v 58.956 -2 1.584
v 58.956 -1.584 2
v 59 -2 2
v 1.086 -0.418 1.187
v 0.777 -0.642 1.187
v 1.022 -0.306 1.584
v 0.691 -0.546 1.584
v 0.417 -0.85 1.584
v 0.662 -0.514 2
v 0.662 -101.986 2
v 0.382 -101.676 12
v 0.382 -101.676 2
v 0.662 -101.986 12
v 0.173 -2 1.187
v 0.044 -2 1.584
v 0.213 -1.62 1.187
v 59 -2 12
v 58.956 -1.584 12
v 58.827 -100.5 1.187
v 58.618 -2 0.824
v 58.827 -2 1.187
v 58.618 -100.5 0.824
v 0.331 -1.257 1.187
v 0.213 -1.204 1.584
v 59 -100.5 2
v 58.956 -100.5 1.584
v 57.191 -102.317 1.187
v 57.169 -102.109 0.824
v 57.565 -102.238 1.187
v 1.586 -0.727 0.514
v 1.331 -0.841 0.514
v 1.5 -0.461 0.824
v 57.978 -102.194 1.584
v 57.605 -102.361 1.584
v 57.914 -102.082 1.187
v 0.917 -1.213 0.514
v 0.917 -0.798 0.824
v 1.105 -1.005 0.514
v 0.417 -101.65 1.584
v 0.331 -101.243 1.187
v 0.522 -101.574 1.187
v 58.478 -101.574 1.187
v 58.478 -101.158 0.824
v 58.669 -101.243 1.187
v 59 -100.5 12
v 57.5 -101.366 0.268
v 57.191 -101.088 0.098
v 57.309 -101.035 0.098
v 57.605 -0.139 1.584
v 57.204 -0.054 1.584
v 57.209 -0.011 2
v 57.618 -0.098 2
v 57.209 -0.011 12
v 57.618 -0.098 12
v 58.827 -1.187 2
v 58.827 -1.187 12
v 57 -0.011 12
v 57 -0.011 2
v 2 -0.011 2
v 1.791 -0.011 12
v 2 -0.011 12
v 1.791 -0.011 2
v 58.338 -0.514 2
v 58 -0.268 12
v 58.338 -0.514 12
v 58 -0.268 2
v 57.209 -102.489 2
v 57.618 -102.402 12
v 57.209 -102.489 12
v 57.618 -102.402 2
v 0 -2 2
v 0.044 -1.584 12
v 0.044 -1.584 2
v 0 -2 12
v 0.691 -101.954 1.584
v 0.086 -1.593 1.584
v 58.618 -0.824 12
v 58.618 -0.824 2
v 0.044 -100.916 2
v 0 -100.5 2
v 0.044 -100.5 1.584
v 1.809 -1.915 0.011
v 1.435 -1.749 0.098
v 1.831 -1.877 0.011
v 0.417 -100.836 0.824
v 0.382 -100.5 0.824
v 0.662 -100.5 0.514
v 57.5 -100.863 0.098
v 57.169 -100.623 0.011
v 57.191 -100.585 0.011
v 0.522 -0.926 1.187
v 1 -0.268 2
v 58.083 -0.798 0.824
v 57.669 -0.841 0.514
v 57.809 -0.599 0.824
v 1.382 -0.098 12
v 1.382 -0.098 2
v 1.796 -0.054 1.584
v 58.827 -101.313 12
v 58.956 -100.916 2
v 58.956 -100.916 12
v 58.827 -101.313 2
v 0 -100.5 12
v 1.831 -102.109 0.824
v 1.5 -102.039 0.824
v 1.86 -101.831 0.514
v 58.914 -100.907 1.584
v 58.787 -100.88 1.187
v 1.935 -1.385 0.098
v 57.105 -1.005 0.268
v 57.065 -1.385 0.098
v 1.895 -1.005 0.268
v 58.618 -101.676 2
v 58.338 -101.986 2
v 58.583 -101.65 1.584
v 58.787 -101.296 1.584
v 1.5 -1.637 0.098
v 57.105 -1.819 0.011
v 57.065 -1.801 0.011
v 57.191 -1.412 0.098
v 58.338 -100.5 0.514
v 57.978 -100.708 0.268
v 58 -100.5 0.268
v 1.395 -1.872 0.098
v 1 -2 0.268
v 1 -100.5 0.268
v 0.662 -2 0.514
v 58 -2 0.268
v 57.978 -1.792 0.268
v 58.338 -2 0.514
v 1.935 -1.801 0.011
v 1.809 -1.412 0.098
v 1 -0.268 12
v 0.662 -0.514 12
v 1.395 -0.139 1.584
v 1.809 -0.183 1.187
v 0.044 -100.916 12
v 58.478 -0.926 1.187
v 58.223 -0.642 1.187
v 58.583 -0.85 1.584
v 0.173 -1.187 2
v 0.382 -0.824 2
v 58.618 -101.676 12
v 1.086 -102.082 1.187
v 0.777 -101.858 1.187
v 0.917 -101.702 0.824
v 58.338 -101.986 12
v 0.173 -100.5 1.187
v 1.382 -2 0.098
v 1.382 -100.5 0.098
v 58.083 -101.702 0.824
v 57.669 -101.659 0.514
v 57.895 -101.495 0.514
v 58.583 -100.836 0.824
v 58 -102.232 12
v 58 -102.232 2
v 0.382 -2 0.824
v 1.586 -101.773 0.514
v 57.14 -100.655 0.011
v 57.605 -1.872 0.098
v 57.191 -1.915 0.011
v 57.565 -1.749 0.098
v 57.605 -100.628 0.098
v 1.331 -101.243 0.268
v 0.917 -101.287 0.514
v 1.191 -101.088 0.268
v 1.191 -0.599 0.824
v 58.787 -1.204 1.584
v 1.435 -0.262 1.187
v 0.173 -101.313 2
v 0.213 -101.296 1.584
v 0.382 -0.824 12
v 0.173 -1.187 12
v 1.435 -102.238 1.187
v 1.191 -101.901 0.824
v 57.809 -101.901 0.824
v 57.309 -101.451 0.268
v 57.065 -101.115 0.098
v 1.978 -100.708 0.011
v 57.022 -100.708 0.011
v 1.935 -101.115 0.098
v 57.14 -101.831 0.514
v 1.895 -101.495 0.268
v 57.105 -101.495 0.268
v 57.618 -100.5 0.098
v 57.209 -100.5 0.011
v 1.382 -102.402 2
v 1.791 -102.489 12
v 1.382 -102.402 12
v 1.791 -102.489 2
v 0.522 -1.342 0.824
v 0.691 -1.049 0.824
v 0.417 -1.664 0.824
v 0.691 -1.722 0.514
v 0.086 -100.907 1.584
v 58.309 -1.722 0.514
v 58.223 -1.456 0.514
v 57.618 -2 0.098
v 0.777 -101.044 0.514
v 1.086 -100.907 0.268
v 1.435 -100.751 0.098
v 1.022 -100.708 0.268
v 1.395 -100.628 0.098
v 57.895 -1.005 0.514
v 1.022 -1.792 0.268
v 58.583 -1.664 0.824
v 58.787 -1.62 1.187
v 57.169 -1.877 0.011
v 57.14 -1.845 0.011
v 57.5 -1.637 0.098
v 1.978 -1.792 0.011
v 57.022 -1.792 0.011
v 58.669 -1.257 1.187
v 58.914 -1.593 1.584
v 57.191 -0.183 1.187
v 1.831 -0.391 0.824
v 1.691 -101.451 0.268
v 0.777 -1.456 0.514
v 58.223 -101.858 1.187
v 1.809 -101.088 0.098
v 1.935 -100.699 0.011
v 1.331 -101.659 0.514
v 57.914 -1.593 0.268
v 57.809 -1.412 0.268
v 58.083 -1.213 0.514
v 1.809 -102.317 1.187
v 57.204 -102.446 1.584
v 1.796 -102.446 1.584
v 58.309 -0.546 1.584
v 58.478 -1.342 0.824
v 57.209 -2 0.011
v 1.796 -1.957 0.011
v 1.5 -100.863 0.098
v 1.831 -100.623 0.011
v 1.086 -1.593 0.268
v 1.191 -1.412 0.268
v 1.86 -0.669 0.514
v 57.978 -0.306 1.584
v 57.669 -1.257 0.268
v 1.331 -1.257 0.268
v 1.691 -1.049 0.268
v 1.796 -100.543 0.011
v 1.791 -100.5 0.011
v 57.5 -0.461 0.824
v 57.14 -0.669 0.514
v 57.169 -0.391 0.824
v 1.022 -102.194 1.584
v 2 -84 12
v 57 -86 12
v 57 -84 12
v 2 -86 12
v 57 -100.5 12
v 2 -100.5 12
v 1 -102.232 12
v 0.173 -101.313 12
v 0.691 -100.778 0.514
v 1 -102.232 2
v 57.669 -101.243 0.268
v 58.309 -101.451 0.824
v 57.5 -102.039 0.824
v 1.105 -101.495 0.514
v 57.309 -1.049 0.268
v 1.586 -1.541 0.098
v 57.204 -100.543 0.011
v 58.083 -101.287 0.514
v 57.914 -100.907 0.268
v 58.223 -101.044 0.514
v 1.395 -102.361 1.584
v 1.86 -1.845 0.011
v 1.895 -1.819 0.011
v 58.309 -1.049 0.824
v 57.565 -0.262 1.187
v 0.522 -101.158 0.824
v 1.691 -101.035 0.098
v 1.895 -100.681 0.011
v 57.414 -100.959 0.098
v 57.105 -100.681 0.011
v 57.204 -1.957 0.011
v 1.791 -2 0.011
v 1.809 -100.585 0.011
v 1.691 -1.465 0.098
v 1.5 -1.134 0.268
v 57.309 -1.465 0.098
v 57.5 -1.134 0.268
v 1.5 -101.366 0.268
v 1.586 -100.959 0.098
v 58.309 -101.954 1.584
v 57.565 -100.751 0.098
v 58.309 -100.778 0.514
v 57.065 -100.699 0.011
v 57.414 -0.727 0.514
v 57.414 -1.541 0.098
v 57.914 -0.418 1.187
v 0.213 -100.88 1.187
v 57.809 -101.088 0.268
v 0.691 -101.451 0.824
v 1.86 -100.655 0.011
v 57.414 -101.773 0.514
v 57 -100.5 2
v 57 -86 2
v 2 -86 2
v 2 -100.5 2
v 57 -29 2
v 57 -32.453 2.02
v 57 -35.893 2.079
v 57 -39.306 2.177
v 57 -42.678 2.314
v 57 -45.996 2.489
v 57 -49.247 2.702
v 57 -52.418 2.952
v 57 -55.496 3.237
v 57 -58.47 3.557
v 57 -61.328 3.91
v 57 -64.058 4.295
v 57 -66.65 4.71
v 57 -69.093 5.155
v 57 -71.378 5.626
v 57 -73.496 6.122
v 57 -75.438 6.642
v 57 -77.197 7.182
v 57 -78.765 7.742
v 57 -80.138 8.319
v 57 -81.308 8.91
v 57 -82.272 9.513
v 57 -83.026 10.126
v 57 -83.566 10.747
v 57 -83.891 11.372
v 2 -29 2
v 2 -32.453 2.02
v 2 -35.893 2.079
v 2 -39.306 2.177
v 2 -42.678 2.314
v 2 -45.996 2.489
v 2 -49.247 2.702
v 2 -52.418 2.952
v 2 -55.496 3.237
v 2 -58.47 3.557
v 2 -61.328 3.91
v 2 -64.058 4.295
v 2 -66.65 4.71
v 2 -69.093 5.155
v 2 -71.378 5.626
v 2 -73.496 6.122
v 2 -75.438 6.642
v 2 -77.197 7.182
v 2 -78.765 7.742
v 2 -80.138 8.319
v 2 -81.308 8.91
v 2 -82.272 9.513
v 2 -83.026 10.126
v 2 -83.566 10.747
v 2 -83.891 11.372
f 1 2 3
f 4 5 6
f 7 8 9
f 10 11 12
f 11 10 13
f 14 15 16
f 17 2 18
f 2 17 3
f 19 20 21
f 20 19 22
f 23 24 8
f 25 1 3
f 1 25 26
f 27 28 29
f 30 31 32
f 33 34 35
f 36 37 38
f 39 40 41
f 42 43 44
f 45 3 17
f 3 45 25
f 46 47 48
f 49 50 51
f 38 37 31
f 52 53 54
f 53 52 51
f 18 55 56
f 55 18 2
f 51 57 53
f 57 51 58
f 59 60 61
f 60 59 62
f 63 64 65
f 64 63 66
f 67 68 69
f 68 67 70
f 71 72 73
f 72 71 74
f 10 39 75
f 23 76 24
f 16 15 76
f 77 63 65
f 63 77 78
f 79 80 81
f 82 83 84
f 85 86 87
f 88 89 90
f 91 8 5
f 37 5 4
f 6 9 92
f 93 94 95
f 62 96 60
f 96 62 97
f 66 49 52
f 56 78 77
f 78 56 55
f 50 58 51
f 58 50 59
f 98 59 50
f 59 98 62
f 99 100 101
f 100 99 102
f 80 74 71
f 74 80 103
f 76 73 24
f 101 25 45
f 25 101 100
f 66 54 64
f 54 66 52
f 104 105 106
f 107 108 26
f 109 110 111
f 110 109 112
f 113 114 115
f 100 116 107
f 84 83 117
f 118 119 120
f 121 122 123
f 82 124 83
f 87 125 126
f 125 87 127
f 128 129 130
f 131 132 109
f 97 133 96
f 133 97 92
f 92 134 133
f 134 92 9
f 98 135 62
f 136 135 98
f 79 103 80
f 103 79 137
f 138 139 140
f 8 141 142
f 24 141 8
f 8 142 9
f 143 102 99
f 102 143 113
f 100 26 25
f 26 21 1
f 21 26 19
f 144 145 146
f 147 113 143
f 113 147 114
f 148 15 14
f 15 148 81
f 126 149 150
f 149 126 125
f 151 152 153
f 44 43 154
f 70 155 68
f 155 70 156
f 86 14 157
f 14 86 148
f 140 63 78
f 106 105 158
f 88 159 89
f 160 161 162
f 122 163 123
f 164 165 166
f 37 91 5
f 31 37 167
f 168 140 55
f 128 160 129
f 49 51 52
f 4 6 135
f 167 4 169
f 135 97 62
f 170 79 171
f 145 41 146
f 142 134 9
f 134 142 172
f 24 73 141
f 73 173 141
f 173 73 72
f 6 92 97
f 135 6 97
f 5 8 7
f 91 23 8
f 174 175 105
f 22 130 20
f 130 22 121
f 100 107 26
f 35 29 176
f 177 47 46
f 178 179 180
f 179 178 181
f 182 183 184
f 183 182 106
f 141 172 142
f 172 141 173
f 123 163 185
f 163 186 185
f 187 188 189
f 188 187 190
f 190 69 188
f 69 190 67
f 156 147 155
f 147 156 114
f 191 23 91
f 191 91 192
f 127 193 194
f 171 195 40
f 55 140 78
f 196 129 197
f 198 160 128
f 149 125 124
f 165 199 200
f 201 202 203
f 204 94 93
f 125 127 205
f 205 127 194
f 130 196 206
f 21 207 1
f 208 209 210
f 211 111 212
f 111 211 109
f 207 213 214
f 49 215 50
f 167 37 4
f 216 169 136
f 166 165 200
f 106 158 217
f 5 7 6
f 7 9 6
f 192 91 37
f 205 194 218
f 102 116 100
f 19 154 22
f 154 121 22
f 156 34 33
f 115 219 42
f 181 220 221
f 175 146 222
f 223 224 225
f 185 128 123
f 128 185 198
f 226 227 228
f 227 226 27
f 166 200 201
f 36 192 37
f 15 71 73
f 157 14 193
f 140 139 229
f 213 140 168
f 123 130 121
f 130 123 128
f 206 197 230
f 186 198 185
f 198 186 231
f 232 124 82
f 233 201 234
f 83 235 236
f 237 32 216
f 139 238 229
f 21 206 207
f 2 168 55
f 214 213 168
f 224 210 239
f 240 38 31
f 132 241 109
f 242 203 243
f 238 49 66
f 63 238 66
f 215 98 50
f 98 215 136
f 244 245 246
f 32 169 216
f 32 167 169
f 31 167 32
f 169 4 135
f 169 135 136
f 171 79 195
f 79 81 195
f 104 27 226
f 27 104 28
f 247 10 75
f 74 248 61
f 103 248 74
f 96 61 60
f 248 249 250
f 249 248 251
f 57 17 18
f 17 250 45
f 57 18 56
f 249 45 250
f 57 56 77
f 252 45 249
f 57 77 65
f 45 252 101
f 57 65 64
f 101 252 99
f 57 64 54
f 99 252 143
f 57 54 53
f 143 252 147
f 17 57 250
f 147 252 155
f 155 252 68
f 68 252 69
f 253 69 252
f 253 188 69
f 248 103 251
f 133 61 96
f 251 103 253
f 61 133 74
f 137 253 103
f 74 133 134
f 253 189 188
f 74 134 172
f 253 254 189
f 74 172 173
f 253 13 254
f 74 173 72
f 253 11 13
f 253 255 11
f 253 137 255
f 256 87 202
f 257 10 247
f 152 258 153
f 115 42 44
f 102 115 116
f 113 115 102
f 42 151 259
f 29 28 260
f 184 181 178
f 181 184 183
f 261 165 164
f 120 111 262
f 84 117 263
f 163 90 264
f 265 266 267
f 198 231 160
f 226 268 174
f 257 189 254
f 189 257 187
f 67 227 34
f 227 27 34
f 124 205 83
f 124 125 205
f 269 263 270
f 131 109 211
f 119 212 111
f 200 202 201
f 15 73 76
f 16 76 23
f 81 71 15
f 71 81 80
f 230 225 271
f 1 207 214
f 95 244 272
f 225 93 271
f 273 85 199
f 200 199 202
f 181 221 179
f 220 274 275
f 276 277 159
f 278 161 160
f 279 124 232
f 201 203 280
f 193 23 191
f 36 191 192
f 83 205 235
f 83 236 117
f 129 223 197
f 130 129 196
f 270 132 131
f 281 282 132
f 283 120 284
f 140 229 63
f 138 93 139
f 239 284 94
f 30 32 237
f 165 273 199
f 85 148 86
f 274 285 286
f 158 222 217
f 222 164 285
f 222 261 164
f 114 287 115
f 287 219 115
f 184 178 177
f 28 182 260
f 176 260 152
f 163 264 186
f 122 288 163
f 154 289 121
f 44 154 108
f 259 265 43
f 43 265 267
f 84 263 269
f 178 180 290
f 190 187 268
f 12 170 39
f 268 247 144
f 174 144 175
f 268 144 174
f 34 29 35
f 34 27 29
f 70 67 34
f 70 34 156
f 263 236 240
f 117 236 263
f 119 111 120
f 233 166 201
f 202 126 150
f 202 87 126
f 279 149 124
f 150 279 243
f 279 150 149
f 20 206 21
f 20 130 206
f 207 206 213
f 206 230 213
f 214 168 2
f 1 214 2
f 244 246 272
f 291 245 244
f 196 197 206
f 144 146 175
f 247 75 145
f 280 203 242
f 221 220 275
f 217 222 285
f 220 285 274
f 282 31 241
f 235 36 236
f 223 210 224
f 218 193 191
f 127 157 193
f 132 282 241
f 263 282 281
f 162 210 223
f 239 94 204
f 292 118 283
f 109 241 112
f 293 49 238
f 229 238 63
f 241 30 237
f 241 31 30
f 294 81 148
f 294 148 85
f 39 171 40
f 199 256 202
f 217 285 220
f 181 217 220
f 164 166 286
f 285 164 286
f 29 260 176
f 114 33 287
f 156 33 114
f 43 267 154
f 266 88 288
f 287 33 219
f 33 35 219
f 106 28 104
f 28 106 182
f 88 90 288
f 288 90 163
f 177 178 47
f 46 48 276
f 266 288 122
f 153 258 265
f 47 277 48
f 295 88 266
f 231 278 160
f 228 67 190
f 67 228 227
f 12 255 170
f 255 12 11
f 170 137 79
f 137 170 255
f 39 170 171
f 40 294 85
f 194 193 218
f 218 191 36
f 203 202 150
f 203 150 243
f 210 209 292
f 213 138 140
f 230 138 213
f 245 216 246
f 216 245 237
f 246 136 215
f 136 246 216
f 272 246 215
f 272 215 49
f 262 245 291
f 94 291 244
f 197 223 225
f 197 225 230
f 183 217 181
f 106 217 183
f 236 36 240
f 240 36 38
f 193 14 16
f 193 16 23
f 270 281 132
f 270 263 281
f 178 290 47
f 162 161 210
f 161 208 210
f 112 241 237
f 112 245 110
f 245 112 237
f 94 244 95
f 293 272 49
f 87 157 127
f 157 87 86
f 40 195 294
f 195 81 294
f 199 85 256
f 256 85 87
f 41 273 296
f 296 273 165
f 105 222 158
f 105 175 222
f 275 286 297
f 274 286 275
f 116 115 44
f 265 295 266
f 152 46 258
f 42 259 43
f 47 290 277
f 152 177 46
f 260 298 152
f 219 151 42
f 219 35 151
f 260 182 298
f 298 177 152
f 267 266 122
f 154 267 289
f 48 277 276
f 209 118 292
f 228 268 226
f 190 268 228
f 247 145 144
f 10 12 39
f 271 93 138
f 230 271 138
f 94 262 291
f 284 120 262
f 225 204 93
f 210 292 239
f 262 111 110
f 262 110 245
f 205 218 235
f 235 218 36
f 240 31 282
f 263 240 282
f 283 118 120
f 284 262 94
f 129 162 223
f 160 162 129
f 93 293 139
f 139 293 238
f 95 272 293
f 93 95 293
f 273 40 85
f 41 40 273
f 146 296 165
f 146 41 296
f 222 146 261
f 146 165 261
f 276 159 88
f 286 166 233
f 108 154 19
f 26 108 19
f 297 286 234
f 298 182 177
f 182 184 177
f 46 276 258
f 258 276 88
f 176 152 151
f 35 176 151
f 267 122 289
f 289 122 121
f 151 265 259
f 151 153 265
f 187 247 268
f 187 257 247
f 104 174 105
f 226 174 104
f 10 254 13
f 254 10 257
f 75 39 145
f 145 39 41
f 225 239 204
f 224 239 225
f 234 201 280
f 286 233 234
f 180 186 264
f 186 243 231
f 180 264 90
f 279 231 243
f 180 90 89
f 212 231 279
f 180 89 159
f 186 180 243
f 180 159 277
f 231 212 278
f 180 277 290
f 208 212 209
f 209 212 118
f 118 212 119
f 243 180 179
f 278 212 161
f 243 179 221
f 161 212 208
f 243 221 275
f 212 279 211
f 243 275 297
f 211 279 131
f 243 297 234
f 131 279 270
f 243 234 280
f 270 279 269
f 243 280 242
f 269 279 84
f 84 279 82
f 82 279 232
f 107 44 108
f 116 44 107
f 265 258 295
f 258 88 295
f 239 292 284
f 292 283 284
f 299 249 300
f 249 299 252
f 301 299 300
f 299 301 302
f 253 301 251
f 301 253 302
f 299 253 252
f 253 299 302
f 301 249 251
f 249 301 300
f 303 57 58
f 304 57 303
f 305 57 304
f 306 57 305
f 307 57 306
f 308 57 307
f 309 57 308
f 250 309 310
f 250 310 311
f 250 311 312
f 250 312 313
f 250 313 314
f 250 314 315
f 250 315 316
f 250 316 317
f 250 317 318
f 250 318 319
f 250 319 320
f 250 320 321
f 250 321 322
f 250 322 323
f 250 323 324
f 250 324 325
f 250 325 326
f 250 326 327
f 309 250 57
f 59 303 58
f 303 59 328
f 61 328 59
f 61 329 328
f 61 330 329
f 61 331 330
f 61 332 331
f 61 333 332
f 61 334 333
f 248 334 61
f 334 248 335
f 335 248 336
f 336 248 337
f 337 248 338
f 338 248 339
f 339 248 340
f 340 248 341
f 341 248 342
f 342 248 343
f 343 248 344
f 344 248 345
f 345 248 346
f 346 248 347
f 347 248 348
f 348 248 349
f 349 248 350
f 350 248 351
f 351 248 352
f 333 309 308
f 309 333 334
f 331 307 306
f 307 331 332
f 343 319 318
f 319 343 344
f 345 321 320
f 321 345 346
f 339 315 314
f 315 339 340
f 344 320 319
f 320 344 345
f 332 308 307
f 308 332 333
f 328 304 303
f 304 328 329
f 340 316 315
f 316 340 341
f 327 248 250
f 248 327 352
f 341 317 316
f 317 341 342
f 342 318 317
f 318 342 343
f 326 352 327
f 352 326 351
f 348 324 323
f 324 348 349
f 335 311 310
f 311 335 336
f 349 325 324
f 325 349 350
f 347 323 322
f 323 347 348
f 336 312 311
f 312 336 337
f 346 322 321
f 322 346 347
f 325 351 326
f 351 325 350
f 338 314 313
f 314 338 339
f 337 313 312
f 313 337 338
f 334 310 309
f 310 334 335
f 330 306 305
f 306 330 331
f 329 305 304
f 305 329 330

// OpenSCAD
// Sizes of objectcs in pictures
// battery size 102,5x54,5x11
// tuner size 112 x 63 x 23
// ft817 case size 135 x 38 x 165

//CUSTOMIZER VARIABLES

opening_width = 55; 

//Box wall thickness
wall = 2; 

// front margin to curved area
front_to_curve = 29;

// external height of the box
h = 12; 

// min lenght of the box 
minlen = 102.5; 

//CUSTOMIZER VARIABLES END

/* [Hidden] */
$fn = 30;

translate([0, 0, h]) rotate([180, 0, 0])  // upside down  to see it better in customizer
    difference() {
        semiround_box([opening_width + wall*2, max(opening_width + wall + front_to_curve, minlen), h]); // main box
        if (opening_width + wall + front_to_curve < minlen) {
            // reduce plastic!!
            // hole is a wall bigger than needed to avoid rendering ghosts
            translate([wall, opening_width + wall + front_to_curve, -wall])
                cube([opening_width, minlen - (opening_width + wall + front_to_curve) - wall, h]);
        }
        translate([wall, 0, 0])
            cube([opening_width, front_to_curve, h - wall]); // front opening
        translate([wall, front_to_curve, 0])
            rotate([0, 90, 0])
                scale([(h-wall)/opening_width, 1, 1])
                    cylinder(opening_width, r=opening_width, $fn=100); // curved reflector
    }

module semiround_box(size, r = 2) {
    x = size[0];
    y = size[1];
    z = size[2];
    hull() {
        for (i = [0, 1]) {
			for (j = [0, 1]) {
                translate([r+i*(x-2*r),r+j*(y-2*r),r+(z-2*r)])
                    sphere(r);
			}
		}
        for (i = [0, 1]) {
			for (j = [0, 1]) {
                translate([r+i*(x-2*r),r+j*(y-2*r),0])
                    cylinder(r, r=r);
			}
		}
    }
}
